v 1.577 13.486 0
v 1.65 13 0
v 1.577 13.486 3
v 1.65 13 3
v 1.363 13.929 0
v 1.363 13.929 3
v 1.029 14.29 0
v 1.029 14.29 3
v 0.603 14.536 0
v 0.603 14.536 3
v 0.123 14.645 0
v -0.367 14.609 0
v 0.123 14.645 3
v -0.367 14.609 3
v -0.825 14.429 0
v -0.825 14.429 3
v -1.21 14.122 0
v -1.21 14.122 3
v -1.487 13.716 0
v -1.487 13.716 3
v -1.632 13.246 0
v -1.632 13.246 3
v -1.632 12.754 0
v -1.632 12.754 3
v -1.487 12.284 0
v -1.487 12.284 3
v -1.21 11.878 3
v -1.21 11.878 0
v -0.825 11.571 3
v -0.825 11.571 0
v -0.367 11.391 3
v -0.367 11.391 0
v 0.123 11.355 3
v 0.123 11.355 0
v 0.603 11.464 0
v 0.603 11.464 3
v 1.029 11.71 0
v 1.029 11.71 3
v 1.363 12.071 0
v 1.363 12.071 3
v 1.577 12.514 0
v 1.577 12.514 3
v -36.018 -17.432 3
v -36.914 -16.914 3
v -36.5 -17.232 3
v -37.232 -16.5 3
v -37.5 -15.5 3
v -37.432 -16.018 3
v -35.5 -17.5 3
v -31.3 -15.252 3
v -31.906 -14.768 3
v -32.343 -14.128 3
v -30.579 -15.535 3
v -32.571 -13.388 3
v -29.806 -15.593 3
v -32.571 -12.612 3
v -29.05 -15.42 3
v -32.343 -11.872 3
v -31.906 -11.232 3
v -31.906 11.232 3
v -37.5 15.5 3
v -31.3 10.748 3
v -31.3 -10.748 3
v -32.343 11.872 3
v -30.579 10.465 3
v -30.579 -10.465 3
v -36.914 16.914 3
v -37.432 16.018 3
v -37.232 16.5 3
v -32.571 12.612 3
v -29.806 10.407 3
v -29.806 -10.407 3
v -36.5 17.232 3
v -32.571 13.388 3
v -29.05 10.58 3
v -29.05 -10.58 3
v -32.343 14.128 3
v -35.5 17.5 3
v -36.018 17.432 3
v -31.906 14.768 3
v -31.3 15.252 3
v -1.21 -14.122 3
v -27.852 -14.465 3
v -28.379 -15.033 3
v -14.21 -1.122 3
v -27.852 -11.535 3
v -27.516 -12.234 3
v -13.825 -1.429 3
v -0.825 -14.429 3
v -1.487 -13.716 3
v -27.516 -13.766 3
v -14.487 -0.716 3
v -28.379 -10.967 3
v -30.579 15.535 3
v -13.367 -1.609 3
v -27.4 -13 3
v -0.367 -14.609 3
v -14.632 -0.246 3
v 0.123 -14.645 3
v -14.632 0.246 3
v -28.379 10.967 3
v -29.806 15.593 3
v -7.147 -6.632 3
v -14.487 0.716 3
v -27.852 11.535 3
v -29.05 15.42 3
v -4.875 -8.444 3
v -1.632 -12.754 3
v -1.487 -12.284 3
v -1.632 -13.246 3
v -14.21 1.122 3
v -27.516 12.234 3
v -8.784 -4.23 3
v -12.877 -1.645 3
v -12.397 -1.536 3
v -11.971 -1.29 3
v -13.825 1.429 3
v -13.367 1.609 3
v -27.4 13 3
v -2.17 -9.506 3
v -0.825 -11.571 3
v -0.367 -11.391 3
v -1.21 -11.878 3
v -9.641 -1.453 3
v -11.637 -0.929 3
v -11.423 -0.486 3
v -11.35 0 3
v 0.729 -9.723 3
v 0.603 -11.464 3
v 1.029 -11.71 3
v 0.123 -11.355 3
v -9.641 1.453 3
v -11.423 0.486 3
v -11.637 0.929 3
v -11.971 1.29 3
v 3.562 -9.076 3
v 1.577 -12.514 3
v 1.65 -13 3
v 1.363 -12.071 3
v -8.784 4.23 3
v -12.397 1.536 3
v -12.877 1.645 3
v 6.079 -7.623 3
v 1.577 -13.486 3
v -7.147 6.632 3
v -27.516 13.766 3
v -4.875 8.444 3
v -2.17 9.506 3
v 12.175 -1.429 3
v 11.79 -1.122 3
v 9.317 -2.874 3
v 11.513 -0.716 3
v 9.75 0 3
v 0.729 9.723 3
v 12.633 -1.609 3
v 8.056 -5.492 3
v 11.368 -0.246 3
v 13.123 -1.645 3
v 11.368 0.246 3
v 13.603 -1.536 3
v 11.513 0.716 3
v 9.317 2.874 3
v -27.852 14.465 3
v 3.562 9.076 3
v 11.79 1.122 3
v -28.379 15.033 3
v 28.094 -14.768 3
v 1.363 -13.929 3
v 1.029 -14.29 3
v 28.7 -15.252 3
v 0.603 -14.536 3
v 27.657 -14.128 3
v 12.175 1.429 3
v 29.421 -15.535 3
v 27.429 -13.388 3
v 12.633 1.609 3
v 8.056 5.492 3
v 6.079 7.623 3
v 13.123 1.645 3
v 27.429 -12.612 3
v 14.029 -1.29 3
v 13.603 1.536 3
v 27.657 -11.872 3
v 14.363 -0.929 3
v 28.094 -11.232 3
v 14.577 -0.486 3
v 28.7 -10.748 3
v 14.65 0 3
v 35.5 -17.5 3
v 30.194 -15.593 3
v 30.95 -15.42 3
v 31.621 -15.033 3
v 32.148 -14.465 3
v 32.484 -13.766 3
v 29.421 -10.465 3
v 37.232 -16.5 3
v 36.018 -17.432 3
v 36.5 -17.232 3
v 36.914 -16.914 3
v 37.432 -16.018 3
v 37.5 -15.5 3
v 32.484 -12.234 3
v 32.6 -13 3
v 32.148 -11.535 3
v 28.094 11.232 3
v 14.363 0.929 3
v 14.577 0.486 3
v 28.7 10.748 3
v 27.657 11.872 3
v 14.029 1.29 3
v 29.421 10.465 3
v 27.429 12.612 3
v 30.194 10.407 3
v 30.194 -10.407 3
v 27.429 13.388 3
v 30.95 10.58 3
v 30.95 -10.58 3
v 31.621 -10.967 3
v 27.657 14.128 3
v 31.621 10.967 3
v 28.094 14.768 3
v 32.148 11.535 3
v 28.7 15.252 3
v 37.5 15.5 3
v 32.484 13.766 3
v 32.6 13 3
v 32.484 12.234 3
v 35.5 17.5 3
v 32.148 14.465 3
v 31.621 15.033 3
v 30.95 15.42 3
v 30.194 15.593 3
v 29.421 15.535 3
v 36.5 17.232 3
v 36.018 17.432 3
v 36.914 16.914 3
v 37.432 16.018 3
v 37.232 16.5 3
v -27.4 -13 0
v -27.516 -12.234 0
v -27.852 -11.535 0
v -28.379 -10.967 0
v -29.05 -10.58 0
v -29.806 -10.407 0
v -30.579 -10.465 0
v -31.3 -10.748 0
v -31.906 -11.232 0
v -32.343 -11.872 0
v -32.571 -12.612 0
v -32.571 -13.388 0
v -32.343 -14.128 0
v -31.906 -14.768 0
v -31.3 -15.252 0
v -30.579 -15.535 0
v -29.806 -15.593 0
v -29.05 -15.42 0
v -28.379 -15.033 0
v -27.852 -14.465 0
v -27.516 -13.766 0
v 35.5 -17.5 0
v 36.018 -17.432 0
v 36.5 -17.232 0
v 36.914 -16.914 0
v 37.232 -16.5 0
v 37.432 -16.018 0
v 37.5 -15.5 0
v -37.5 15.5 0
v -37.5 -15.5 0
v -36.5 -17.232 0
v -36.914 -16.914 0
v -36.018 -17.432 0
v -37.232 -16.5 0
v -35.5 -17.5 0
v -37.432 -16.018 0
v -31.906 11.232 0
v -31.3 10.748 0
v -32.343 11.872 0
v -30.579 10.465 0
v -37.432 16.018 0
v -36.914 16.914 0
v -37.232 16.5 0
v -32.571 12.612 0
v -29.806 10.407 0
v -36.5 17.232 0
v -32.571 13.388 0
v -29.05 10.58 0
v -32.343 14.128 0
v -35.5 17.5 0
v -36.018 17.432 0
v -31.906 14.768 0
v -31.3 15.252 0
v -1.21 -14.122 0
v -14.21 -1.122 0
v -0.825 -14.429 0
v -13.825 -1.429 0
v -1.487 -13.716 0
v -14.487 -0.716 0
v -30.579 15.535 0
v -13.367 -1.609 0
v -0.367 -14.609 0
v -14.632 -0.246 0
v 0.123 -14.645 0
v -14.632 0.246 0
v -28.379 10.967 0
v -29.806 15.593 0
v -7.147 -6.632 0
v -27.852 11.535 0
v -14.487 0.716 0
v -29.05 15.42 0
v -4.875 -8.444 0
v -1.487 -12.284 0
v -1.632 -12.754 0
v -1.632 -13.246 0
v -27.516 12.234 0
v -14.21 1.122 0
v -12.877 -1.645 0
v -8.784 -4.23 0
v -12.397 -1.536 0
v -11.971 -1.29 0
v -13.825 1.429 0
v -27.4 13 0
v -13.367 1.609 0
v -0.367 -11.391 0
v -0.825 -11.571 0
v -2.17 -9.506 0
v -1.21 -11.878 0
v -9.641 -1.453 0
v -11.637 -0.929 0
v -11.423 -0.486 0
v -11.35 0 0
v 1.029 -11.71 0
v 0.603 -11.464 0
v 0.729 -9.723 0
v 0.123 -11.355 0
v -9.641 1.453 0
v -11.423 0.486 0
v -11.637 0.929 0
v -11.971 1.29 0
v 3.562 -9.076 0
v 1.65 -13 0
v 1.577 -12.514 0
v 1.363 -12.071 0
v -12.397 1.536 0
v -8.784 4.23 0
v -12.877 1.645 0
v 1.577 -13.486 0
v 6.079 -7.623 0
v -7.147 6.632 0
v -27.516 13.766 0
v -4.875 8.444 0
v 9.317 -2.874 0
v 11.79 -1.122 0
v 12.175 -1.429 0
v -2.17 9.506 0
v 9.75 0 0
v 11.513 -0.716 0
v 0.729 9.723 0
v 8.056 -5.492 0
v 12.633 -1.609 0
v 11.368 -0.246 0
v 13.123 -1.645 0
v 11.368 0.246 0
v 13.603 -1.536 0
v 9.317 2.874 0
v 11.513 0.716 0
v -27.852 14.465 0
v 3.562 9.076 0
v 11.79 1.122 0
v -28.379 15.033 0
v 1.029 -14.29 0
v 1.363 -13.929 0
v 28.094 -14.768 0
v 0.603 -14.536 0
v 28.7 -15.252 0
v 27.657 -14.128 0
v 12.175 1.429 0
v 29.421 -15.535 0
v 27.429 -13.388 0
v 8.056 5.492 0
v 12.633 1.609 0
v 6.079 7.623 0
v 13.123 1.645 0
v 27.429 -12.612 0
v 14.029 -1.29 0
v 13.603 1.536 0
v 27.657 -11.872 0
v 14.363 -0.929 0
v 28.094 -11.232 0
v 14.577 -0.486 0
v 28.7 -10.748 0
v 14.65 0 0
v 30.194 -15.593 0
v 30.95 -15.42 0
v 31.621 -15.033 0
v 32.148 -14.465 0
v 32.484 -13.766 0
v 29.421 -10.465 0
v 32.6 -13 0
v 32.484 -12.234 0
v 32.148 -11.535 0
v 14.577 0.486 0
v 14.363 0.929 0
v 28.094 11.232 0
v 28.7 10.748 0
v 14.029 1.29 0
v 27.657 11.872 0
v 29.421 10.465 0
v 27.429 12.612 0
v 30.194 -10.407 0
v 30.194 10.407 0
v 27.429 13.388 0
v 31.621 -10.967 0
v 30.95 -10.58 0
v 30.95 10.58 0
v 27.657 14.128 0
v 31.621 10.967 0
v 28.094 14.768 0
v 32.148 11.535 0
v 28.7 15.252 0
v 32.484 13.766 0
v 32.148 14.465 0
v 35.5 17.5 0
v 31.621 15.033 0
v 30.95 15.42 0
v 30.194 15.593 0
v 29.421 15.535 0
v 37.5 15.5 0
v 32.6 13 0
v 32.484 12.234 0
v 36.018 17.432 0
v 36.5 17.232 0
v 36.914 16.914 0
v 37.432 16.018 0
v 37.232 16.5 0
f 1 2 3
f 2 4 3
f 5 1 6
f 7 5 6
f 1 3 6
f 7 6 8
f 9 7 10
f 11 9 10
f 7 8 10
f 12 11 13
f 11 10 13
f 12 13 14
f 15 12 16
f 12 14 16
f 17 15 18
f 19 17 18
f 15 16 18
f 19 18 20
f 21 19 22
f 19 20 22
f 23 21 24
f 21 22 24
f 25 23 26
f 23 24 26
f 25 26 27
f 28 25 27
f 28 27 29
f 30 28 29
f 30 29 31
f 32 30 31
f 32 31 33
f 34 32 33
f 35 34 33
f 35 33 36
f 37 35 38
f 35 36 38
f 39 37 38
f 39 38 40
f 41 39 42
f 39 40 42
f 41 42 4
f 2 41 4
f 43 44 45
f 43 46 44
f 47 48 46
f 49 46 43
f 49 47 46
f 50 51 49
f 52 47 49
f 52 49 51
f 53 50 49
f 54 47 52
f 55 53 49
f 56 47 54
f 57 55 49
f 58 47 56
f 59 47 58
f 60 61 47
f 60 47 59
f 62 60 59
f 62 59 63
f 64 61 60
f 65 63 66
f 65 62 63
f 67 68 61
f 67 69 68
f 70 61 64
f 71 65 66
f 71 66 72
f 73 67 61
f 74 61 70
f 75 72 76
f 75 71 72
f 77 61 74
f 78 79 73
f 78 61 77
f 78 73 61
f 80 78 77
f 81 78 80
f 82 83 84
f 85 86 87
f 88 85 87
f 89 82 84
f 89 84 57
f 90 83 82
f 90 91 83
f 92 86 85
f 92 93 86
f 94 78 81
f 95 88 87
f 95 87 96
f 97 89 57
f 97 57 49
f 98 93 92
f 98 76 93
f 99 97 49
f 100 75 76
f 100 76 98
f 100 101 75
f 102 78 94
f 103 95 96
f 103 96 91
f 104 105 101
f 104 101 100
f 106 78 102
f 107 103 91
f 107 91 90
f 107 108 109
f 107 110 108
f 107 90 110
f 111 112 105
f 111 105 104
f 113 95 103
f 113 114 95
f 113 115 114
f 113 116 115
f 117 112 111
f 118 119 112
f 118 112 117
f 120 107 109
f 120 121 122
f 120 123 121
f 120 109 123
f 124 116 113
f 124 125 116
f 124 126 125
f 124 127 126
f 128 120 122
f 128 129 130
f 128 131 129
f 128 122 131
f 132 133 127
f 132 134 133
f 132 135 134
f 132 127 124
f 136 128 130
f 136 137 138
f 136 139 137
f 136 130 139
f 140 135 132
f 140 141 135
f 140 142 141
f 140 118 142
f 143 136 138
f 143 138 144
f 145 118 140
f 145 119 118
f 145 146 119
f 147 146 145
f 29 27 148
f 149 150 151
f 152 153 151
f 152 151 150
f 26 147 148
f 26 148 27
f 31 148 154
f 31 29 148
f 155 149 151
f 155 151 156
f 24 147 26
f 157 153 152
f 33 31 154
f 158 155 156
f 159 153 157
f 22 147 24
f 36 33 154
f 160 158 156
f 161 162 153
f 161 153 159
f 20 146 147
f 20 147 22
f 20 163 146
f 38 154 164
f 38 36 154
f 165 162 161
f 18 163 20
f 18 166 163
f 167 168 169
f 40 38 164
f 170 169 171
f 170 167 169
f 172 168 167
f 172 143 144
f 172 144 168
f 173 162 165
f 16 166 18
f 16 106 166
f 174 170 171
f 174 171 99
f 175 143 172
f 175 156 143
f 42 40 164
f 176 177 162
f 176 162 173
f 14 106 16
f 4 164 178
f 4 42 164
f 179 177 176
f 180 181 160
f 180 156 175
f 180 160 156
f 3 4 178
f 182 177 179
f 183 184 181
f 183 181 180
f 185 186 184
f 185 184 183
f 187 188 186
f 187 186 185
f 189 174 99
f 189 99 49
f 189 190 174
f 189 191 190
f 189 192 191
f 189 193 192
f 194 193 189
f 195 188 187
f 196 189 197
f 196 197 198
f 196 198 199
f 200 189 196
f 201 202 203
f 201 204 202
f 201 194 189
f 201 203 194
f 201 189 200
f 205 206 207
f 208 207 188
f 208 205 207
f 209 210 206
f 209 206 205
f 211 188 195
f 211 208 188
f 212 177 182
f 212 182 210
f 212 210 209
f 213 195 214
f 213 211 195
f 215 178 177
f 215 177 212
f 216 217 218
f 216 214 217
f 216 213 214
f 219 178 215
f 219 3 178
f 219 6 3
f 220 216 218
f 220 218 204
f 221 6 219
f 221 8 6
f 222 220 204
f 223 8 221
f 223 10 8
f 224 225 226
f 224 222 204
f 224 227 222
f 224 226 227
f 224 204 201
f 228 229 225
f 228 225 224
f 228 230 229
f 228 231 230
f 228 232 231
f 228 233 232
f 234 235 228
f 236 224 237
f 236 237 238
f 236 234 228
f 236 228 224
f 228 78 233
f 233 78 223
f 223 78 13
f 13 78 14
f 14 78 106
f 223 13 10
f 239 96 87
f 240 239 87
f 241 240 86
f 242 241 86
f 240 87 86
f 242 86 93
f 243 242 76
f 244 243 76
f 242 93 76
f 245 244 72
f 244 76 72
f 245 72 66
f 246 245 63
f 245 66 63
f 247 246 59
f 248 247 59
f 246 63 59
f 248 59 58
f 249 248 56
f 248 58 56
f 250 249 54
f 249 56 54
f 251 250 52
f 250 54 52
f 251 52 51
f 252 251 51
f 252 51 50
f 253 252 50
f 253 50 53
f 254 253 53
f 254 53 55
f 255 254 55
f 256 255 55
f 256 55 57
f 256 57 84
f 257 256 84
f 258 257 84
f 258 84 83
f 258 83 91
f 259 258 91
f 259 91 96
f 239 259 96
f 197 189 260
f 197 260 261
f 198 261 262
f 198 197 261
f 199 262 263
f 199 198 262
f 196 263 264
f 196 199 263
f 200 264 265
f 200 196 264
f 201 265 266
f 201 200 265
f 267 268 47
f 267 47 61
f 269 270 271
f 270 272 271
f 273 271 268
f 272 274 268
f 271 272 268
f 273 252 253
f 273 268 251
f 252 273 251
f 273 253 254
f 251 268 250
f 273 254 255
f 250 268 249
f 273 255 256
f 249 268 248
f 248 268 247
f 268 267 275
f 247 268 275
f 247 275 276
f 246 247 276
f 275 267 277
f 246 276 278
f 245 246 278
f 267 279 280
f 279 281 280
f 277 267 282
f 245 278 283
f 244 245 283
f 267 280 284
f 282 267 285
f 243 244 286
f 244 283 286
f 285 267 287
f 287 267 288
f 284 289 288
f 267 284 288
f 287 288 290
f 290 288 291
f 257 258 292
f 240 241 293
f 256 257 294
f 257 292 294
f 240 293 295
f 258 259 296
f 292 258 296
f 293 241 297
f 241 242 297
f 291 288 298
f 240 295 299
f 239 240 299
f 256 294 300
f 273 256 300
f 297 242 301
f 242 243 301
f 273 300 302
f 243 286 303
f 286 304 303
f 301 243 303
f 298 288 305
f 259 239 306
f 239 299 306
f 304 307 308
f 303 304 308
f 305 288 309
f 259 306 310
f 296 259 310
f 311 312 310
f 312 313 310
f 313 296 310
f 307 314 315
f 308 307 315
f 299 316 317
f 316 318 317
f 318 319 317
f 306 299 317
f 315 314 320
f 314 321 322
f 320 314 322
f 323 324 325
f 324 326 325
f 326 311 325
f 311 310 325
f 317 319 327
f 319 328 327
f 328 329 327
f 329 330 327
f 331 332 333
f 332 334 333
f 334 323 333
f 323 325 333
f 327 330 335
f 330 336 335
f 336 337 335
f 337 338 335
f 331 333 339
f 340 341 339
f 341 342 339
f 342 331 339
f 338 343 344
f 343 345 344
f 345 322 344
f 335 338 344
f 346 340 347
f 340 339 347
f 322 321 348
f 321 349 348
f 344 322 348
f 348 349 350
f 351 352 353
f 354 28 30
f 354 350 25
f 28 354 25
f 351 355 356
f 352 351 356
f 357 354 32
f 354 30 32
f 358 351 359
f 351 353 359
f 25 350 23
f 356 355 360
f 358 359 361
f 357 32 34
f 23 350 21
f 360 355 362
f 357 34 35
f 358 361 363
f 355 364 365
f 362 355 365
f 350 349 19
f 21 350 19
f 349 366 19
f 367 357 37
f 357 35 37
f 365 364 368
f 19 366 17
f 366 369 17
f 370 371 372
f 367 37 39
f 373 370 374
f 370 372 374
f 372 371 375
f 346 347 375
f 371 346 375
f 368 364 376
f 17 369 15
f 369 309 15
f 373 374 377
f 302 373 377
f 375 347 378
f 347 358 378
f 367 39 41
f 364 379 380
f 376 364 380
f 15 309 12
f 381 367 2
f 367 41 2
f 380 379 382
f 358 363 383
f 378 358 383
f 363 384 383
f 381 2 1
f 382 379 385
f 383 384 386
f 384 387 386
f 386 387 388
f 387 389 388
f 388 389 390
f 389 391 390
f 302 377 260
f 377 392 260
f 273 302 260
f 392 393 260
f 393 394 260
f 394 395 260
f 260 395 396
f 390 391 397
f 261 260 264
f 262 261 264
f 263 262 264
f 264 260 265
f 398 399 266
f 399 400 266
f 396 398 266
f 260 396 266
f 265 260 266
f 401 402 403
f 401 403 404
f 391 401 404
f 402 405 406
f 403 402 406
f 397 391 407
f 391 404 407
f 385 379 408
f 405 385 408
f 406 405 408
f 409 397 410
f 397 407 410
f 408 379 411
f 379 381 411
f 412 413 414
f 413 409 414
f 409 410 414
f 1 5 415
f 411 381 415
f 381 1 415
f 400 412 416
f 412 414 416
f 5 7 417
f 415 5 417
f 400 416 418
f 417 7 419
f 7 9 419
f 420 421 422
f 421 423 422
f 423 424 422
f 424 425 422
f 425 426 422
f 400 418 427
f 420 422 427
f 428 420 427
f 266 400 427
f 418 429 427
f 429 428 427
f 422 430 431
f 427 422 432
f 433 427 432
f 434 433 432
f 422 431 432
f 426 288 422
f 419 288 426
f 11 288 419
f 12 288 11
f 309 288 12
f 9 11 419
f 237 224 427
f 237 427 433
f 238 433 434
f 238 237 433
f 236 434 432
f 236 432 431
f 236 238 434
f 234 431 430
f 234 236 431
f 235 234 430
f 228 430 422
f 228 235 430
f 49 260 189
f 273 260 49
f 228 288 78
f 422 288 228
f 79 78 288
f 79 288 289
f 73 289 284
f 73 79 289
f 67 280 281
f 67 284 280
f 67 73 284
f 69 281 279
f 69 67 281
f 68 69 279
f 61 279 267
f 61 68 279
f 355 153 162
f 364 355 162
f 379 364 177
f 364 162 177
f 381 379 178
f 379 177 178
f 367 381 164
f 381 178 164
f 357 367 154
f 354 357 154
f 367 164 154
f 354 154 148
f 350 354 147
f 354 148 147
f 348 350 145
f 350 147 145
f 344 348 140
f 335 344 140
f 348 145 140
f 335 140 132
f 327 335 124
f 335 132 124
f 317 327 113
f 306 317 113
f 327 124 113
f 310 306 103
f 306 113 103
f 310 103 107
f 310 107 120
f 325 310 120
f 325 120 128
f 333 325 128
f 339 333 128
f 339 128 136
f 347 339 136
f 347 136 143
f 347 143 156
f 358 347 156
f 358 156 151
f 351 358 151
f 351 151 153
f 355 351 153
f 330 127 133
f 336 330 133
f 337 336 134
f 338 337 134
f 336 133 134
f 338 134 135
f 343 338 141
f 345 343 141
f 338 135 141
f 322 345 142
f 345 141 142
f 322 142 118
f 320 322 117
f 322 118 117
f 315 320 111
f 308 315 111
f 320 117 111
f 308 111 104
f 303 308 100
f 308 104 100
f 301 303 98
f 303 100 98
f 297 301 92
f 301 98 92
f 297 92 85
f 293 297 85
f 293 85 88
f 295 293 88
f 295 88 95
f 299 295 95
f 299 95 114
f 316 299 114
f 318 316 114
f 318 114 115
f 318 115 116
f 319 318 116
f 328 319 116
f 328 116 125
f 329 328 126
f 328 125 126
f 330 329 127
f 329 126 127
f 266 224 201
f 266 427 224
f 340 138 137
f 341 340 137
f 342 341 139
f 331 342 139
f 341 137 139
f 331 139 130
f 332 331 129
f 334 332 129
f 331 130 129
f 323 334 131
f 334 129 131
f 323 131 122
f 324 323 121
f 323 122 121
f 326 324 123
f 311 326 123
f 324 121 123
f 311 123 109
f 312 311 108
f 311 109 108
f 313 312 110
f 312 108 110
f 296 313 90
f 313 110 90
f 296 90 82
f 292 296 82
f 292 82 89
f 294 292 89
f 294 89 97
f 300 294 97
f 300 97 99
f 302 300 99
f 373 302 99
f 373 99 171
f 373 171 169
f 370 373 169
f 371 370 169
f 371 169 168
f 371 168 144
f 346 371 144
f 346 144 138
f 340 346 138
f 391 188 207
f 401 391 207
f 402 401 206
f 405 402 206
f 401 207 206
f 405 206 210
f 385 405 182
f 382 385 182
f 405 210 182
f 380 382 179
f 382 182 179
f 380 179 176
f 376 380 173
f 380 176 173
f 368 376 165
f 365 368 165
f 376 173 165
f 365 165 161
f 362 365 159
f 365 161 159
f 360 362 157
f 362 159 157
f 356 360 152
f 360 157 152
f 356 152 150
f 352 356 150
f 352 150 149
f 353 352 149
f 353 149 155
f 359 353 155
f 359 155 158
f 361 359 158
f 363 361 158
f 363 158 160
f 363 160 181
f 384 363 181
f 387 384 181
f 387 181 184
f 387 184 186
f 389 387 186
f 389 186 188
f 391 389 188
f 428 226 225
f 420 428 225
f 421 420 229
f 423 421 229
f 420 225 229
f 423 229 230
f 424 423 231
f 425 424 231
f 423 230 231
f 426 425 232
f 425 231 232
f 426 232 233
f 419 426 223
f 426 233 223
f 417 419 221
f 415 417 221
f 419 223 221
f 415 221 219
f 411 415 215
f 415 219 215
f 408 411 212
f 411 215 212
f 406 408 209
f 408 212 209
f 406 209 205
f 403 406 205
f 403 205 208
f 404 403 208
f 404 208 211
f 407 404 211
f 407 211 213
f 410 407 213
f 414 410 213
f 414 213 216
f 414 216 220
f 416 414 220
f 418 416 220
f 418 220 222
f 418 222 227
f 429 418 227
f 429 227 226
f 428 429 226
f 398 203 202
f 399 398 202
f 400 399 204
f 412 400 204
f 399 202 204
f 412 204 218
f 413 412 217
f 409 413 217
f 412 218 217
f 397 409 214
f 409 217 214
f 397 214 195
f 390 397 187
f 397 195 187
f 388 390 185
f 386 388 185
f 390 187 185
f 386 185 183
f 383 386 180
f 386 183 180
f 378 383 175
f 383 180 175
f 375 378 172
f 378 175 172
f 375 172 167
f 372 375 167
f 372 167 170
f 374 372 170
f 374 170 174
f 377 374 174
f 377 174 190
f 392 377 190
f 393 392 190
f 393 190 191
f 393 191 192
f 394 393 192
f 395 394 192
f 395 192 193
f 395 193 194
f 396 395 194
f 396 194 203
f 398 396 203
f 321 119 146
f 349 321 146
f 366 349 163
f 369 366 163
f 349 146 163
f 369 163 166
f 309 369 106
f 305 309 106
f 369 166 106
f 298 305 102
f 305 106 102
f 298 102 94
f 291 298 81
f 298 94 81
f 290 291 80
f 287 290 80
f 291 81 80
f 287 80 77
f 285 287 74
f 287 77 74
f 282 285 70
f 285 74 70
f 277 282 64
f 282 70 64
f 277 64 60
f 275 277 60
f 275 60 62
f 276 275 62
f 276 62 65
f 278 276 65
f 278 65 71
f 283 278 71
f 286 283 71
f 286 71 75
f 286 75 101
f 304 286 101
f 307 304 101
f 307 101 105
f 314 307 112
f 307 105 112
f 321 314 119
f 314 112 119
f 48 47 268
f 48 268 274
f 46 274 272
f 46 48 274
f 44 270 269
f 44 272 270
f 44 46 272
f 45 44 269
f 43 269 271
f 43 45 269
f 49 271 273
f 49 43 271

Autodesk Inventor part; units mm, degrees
ref_plane "YZ Plane" through (0, 0, 0) normal (1, 0, 0) x (0, 1, 0)
ref_plane "XZ Plane" through (0, 0, 0) normal (0, 1, 0) x (-1, 0, 0)
ref_plane "XY Plane" through (0, 0, 0) normal (0, 0, 1) x (1, 0, 0)
sketch "スケッチ6" plane through (0, 0, 0) normal (0, 0, 1) x (1, 0, 0)
  line L0 (37.5, -17.5) -> (-37.5, -17.5)
  line L1 (-37.5, -17.5) -> (-37.5, 17.5)
  line L2 (-37.5, 17.5) -> (37.5, 17.5)
  line L3 (37.5, 17.5) -> (37.5, -17.5)
  line L4 (37.5, -17.5) -> (-37.5, 17.5) construction
  line L5 (-37.5, -17.5) -> (37.5, 17.5) construction
  point P0 (0, 0)
  dimension "d29" = 75
  dimension "d30" = 35
extrude "押し出し6" add sketch "スケッチ6" along normal blind 3
sketch "スケッチ7" plane through (0, 0, 3) normal (0, 0, 1) x (1, 0, 0)
  circle A0 centre (0, 0) radius 9.75
  dimension "d33" = 19.5
extrude "押し出し7" cut sketch "スケッチ7" against normal blind 3
sketch "スケッチ8" plane through (0, 0, 3) normal (0, 0, 1) x (1, 0, 0)
  circle A0 centre (0, 13) radius 1.65
  circle A1 centre (0, -13) radius 1.65
  circle A2 centre (13, 0) radius 1.65
  circle A3 centre (-13, 0) radius 1.65
  point P0 (0, 0)
  dimension "d36" = 3.3
  dimension "d37" = 3.3
  dimension "d38" = 3.3
  dimension "d39" = 3.3
extrude "押し出し8" cut sketch "スケッチ8" against normal blind 3
sketch "スケッチ9" plane through (0, 0, 3) normal (0, 0, 1) x (1, 0, 0)
  circle A0 centre (-30, 13) radius 2.6
  circle A1 centre (30, 13) radius 2.6
  circle A2 centre (-30, -13) radius 2.6
  circle A3 centre (30, -13) radius 2.6
  point P0 (0, 0)
  dimension "d50" = 5.2
  dimension "d51" = 5.2
  dimension "d52" = 5.2
  dimension "d53" = 5.2
sketch "スケッチ10" plane through (0, 0, 3) normal (0, 0, 1) x (1, 0, 0)
  circle A0 centre (0, 0) radius 16
  dimension "d43" = 32
extrude "押し出し9" cut sketch "スケッチ9" against normal blind 3
fillet "フィレット1" radius 2 4 edges at (-37.5, 17.5, 1.5) (37.5, 17.5, 1.5) (37.5, -17.5, 1.5) (-37.5, -17.5, 1.5)
properties part number "板 中心Φ7" material "アルミニウム 6061"
